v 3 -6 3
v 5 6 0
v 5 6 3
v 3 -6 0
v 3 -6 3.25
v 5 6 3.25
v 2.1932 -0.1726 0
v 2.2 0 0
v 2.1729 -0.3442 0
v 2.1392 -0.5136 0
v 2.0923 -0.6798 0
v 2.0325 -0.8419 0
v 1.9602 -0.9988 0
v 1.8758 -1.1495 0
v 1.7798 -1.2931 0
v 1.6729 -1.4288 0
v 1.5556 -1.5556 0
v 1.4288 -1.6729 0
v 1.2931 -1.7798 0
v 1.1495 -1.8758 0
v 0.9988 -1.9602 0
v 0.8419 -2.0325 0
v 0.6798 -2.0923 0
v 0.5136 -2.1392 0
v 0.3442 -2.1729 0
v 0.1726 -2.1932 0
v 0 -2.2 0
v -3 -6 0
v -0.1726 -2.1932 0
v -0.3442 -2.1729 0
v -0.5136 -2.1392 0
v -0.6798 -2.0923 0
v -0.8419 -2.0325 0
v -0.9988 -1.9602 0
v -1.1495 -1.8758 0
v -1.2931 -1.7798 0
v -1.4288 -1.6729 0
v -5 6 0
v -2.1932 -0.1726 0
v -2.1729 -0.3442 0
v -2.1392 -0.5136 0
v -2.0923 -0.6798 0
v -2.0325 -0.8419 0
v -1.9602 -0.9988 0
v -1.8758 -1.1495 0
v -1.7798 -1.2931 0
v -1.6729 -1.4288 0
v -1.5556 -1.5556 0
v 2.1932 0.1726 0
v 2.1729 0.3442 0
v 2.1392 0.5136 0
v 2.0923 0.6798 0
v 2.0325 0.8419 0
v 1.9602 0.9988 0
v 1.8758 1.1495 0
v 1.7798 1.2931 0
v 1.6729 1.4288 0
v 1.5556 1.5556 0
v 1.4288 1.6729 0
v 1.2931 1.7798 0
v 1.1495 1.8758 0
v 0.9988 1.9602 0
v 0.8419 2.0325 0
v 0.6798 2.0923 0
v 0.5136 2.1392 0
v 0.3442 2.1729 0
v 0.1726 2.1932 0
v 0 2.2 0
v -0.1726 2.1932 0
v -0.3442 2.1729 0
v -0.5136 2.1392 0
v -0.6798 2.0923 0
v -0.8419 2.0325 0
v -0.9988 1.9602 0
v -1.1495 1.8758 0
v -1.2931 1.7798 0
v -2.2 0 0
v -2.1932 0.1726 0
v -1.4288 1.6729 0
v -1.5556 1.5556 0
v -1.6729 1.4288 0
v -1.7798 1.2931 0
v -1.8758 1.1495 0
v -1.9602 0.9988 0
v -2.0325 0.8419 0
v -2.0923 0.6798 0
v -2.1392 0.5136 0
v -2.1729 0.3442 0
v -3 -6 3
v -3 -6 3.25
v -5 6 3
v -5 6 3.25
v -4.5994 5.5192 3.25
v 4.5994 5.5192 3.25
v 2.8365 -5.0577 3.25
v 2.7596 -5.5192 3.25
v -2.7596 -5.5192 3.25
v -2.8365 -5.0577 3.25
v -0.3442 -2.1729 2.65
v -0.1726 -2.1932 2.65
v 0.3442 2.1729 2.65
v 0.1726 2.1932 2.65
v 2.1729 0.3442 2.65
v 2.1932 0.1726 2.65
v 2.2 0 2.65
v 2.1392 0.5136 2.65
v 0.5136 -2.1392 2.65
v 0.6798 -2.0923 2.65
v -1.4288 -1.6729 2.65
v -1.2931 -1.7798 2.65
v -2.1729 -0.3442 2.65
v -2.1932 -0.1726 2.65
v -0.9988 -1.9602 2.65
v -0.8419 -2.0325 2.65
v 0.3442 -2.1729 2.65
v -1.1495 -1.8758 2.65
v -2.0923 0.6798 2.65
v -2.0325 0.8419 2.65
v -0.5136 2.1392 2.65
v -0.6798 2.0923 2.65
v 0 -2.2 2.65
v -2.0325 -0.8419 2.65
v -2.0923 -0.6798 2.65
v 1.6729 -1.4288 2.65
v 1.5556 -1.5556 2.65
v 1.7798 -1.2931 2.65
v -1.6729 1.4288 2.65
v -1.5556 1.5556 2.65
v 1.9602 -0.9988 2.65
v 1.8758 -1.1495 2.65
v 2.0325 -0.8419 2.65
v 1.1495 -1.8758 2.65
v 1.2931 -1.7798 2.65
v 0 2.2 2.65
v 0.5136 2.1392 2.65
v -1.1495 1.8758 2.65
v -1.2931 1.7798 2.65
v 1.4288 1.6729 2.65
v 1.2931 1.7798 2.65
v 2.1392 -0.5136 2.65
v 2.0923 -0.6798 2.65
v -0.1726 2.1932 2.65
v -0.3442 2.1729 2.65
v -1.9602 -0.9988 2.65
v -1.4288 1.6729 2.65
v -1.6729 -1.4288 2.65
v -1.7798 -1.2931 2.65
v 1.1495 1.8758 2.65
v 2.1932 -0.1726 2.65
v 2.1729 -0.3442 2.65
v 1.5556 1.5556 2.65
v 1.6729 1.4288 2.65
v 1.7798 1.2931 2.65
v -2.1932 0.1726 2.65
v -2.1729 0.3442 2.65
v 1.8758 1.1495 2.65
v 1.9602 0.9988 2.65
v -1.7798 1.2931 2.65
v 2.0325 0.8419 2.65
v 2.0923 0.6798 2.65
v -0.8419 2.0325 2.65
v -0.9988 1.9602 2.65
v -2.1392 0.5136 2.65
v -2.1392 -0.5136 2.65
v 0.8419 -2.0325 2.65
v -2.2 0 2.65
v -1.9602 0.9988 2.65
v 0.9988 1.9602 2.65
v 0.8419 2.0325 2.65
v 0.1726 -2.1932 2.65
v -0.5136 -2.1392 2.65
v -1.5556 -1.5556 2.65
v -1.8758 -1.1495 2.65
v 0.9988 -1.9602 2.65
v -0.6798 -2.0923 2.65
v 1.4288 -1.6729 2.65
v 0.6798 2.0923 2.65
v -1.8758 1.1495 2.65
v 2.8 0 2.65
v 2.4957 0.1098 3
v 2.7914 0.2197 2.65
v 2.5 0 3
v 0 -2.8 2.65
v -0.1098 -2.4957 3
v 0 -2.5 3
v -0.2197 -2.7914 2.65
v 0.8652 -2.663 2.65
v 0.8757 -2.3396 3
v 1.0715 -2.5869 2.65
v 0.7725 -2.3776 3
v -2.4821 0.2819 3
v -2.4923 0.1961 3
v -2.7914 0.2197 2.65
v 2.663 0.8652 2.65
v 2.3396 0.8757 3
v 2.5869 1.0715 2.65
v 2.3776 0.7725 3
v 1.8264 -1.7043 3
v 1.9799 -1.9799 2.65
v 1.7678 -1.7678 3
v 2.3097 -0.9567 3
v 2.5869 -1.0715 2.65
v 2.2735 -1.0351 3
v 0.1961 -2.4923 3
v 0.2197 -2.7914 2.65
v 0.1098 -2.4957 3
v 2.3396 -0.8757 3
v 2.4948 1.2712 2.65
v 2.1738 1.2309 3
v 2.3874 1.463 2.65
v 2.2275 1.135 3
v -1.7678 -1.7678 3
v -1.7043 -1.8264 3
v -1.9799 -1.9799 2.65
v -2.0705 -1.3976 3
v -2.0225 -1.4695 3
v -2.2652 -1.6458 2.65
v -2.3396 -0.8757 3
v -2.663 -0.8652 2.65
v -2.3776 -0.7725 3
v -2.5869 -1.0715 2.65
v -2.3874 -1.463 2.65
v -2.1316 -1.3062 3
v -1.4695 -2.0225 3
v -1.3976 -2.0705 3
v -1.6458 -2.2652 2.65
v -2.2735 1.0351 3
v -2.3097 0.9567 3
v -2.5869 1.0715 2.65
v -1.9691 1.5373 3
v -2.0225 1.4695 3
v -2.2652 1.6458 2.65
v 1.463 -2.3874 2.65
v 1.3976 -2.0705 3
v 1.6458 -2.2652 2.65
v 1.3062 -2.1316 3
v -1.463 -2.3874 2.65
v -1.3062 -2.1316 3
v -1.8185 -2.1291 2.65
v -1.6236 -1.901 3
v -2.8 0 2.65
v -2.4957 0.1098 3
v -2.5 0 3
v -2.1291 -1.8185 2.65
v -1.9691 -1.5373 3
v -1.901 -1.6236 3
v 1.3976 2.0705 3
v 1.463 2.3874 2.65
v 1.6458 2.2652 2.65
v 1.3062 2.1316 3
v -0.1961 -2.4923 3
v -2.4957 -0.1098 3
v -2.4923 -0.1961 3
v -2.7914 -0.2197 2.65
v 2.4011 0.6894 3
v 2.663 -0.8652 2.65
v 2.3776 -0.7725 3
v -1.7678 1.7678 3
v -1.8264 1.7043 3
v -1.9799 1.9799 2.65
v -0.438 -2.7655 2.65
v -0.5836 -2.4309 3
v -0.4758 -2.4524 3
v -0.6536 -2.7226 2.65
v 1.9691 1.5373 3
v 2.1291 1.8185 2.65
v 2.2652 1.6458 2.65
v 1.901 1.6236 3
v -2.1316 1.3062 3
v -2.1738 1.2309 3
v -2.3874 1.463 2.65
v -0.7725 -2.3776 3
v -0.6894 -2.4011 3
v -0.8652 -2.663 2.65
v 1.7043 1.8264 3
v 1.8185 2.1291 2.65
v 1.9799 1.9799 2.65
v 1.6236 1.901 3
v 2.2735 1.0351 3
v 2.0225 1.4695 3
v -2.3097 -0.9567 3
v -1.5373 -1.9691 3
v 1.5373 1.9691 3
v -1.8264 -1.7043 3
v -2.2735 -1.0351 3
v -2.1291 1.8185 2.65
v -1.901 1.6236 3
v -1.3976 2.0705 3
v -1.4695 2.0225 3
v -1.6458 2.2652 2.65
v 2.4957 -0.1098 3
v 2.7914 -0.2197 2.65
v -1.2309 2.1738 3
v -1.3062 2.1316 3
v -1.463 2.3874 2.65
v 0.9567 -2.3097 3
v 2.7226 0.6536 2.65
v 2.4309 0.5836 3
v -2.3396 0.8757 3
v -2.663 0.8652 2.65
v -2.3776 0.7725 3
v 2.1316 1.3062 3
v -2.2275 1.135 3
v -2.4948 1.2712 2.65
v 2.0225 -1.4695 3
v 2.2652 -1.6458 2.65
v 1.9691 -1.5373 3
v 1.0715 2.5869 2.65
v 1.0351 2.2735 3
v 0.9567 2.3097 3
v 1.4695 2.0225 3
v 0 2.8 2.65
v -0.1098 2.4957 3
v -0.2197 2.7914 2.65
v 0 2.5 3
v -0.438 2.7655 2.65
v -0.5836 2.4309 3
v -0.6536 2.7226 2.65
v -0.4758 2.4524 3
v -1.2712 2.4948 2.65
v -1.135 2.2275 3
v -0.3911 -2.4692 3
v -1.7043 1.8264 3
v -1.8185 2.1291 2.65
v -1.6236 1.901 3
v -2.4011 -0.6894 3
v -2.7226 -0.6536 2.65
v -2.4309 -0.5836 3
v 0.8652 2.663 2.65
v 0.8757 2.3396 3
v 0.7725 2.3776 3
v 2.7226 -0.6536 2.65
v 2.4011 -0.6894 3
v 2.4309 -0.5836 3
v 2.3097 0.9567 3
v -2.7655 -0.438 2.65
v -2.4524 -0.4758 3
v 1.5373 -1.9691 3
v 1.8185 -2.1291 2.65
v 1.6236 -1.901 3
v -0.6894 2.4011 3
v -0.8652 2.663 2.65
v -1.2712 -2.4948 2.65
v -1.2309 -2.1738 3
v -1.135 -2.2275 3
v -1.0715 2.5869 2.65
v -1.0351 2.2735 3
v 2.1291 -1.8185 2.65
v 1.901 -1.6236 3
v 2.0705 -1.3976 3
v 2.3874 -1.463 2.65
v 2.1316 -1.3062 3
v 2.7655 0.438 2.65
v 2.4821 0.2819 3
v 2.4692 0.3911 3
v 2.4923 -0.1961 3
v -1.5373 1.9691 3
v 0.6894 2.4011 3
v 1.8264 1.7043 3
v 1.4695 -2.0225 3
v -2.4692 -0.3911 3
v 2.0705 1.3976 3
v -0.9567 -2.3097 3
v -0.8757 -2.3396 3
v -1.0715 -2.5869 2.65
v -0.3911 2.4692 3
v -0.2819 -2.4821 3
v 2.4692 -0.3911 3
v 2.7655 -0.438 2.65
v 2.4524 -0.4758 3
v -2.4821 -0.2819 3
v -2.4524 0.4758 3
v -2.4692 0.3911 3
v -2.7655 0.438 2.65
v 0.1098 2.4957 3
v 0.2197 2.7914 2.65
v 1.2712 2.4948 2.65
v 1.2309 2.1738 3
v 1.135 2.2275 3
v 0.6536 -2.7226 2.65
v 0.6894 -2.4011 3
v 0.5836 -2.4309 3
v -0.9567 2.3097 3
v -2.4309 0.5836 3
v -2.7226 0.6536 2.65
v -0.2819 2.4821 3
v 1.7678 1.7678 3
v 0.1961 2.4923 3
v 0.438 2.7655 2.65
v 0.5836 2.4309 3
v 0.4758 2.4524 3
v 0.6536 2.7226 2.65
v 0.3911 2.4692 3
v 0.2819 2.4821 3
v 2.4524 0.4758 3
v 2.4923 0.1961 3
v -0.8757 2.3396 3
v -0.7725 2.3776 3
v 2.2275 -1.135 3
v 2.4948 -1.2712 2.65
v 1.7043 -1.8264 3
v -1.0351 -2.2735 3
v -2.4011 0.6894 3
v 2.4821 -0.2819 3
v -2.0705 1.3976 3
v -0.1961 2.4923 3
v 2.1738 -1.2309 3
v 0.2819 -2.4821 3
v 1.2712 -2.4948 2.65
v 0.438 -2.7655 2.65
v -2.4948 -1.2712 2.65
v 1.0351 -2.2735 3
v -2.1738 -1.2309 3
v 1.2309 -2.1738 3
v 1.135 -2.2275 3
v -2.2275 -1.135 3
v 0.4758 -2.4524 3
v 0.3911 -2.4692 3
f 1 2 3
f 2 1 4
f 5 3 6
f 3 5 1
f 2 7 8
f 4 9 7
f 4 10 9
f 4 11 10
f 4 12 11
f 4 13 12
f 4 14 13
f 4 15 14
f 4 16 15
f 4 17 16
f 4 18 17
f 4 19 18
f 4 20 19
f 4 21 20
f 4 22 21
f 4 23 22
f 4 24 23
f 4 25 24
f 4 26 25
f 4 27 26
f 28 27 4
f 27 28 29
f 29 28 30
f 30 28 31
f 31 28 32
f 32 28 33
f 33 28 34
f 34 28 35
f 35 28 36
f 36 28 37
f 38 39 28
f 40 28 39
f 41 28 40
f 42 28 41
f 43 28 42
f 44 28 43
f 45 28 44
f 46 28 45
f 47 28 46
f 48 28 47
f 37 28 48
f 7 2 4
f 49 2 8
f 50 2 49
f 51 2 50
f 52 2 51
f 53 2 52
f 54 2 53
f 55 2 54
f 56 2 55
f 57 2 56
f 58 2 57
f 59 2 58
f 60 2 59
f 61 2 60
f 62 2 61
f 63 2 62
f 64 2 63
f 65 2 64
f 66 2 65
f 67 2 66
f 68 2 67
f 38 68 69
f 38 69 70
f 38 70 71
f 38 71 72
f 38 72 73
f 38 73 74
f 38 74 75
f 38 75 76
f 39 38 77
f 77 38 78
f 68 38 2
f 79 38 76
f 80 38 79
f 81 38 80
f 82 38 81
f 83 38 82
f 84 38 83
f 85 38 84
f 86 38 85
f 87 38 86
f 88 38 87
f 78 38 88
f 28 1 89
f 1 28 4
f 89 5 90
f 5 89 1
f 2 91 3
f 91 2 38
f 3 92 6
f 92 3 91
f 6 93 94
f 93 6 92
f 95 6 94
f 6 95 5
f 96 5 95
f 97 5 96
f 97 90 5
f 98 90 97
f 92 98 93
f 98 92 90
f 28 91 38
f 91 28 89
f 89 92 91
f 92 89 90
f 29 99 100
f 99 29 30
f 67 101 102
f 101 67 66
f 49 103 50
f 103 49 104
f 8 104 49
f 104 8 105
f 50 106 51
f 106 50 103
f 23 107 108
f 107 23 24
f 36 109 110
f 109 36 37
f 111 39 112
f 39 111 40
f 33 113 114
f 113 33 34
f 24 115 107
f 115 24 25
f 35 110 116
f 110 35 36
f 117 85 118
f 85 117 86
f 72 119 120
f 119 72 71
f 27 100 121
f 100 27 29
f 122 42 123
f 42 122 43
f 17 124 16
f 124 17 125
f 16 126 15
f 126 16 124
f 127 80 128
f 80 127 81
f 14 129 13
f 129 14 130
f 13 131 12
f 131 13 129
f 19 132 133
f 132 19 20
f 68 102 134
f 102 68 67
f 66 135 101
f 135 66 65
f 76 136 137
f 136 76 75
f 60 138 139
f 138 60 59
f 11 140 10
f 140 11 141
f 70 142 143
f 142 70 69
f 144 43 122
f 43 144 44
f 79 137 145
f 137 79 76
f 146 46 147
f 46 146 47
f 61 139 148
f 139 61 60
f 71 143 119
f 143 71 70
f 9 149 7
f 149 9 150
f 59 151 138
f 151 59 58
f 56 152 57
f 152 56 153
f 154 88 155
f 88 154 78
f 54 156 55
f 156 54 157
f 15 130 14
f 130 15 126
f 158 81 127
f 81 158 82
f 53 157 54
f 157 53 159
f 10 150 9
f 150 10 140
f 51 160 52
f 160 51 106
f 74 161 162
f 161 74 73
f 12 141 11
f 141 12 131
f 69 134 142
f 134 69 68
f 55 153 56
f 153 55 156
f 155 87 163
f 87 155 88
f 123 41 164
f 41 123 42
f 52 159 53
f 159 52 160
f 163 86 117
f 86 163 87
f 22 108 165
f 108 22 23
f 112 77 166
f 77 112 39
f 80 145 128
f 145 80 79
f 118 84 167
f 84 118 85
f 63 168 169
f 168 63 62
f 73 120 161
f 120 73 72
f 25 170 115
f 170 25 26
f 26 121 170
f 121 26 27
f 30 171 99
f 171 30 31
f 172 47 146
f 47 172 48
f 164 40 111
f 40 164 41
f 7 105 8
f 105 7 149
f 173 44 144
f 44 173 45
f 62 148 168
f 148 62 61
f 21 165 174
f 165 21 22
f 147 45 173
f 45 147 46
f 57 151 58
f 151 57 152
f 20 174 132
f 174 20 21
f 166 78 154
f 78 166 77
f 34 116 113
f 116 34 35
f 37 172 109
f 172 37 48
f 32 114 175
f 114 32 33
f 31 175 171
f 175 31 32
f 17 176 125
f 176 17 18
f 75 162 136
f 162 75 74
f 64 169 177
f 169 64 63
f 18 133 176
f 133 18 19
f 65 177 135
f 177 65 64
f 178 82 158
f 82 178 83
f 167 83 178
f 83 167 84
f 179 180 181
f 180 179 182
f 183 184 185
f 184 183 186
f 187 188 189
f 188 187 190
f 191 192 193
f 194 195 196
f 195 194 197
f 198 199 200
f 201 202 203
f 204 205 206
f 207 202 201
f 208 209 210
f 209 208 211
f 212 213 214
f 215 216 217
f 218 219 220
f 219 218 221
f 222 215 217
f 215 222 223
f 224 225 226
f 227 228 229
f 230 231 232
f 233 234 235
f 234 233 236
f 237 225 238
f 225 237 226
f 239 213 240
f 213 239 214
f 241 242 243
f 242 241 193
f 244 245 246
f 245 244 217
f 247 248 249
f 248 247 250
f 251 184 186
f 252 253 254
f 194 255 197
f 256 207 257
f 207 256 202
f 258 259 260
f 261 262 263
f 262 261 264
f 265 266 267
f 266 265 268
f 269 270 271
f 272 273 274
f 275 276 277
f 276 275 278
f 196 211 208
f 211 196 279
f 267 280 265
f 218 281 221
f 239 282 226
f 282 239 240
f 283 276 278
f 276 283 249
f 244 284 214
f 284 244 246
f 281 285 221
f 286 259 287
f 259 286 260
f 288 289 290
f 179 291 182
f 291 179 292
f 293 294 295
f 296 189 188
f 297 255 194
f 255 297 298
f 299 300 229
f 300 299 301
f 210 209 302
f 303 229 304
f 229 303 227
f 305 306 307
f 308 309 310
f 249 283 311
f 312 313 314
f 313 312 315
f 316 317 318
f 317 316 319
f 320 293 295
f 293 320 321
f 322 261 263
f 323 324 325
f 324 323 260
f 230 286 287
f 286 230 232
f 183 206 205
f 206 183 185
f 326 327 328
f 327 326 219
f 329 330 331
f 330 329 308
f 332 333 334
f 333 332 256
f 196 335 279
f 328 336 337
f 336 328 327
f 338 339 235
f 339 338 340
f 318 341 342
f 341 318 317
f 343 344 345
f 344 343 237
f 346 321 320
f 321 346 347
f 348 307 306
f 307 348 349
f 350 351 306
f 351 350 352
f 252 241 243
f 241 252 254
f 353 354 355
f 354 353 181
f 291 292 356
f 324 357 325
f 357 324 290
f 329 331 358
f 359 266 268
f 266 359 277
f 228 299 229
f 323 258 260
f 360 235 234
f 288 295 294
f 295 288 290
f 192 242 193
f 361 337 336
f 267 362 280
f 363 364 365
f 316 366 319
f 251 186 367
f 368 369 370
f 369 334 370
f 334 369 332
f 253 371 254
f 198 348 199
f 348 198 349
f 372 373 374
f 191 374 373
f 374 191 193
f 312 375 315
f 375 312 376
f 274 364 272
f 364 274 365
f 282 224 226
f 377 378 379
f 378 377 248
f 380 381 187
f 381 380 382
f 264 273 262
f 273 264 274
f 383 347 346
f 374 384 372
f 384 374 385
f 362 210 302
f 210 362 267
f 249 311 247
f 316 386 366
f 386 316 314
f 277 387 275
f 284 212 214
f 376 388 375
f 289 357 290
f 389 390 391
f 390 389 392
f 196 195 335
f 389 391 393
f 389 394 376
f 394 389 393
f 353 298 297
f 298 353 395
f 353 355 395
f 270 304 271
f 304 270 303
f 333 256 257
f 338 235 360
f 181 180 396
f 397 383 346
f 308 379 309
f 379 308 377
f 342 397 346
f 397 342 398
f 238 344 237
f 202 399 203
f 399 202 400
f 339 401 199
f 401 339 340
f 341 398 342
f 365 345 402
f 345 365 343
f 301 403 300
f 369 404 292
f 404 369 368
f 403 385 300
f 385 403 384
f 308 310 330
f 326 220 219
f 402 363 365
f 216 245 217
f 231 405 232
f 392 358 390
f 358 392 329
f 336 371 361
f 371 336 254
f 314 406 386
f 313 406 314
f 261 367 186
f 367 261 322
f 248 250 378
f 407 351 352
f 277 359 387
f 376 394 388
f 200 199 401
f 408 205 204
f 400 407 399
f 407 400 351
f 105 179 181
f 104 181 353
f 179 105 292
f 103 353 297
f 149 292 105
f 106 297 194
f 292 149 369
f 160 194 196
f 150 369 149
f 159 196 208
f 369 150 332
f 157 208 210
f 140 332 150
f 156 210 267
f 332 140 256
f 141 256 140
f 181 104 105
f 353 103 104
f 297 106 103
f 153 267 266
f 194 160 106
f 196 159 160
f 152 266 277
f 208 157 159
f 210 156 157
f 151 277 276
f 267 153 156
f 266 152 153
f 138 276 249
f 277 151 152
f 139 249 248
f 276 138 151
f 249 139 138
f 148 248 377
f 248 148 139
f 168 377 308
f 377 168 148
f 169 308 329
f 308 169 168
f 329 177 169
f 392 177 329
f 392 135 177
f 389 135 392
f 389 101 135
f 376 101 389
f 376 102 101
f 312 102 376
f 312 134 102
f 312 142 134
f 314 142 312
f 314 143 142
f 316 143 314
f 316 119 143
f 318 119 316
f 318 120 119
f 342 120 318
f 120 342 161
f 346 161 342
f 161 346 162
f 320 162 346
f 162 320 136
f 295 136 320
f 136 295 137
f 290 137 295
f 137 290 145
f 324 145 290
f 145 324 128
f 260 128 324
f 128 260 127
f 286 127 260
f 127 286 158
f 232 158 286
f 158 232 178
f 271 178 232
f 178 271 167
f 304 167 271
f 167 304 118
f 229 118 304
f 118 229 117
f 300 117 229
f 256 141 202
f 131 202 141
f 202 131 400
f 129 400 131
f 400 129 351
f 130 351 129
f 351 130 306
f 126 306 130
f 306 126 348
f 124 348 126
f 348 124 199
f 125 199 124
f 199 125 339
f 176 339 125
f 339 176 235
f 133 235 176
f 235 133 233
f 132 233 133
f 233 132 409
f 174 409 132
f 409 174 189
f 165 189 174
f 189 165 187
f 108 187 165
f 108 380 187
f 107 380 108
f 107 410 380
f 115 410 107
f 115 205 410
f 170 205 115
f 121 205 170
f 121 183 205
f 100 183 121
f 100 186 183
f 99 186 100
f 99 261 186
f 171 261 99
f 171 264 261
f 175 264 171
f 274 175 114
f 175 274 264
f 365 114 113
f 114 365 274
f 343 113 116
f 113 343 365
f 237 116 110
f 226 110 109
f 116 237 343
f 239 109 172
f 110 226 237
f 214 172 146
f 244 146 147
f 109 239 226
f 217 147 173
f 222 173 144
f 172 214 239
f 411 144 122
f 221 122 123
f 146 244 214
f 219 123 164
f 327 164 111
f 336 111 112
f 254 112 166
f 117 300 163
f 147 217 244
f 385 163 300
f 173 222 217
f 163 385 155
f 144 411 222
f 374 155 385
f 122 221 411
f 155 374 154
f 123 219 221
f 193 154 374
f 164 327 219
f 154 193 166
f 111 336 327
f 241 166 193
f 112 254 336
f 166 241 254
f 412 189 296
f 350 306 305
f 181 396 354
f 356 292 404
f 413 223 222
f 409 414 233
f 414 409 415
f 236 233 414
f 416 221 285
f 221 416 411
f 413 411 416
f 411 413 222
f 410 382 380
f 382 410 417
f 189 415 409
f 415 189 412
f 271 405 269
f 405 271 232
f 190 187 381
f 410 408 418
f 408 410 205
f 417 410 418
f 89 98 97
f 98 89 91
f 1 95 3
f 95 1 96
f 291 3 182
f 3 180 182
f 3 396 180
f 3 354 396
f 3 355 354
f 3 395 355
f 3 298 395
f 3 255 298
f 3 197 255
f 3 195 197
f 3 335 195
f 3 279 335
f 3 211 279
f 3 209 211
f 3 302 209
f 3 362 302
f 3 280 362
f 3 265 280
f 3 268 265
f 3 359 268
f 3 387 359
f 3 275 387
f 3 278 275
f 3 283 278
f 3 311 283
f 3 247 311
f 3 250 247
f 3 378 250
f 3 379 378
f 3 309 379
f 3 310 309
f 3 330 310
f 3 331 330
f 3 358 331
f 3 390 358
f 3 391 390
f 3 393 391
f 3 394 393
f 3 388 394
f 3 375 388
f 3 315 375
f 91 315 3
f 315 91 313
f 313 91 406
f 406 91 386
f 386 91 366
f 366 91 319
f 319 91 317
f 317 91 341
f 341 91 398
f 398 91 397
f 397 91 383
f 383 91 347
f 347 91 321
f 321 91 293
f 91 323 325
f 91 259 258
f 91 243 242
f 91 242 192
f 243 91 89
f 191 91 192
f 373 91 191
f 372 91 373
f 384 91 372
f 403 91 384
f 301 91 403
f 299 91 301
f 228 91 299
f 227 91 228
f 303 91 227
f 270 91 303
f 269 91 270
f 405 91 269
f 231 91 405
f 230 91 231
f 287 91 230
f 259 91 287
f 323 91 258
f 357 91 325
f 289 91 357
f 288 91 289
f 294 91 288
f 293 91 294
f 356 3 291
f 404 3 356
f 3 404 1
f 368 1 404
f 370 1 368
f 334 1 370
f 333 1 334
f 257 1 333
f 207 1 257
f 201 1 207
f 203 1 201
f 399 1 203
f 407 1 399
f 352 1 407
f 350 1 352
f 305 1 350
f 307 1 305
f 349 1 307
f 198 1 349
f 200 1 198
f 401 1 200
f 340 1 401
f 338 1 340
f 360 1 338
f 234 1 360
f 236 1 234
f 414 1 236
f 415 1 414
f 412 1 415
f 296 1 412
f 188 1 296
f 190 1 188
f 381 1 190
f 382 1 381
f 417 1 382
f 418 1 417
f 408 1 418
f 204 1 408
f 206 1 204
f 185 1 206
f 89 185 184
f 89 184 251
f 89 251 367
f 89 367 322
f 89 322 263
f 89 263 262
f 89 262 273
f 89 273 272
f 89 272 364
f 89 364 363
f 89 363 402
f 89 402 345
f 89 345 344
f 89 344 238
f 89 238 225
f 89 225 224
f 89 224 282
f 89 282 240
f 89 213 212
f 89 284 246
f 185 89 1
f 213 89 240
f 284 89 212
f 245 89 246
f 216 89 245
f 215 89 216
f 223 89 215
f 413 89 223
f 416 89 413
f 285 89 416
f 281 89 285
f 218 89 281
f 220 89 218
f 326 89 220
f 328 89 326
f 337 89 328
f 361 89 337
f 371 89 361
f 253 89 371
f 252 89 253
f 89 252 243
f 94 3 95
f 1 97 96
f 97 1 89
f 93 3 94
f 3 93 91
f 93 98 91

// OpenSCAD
$fn = 80;

// T-slot nut parameters (mm)
screw_d = 4.0;          // screw diameter
clearance = 0.4;        // hole clearance
hole_d = screw_d + clearance;

af = 6.0;               // across flats
th = 3.25;              // thickness

// Typical T-slot nut proportions (adjustable)
length = 12.0;          // along slot
top_w = 6.0;            // top width (fits slot opening)
bottom_w = 10.0;        // bottom width (undercut capture)
taper_h = th;           // full-height taper

// Optional small edge chamfer
chamfer = 0.25;

module hex_prism_across_flats(af, h){
    // For a regular hex, across flats = 2*R*cos(30) => R = af / sqrt(3)
    R = af / sqrt(3);
    cylinder(h=h, r=R, $fn=6);
}

module tslot_nut(){
    difference(){
        // Body: trapezoidal prism (top narrower than bottom)
        // Use linear_extrude of a 2D trapezoid in X (width) vs Y (length)
        translate([0,0,0])
        linear_extrude(height=th)
            polygon(points=[
                [-top_w/2, -length/2],
                [ top_w/2, -length/2],
                [ bottom_w/2,  length/2],
                [-bottom_w/2,  length/2]
            ]);

        // Through hole for screw
        translate([0,0,-0.5])
            cylinder(h=th+1.0, d=hole_d);

        // Optional shallow top chamfer around hole (countersink-like)
        translate([0,0,th-0.6])
            cylinder(h=0.7, d1=hole_d+1.2, d2=hole_d);

        // Edge chamfers (approx) by subtracting thin wedges
        if (chamfer > 0){
            // Top perimeter chamfer
            translate([0,0,th-chamfer])
                linear_extrude(height=chamfer+0.01, scale=(top_w-2*chamfer)/top_w)
                    polygon(points=[
                        [-top_w/2, -length/2],
                        [ top_w/2, -length/2],
                        [ bottom_w/2,  length/2],
                        [-bottom_w/2,  length/2]
                    ]);
        }
    }
}

tslot_nut();
